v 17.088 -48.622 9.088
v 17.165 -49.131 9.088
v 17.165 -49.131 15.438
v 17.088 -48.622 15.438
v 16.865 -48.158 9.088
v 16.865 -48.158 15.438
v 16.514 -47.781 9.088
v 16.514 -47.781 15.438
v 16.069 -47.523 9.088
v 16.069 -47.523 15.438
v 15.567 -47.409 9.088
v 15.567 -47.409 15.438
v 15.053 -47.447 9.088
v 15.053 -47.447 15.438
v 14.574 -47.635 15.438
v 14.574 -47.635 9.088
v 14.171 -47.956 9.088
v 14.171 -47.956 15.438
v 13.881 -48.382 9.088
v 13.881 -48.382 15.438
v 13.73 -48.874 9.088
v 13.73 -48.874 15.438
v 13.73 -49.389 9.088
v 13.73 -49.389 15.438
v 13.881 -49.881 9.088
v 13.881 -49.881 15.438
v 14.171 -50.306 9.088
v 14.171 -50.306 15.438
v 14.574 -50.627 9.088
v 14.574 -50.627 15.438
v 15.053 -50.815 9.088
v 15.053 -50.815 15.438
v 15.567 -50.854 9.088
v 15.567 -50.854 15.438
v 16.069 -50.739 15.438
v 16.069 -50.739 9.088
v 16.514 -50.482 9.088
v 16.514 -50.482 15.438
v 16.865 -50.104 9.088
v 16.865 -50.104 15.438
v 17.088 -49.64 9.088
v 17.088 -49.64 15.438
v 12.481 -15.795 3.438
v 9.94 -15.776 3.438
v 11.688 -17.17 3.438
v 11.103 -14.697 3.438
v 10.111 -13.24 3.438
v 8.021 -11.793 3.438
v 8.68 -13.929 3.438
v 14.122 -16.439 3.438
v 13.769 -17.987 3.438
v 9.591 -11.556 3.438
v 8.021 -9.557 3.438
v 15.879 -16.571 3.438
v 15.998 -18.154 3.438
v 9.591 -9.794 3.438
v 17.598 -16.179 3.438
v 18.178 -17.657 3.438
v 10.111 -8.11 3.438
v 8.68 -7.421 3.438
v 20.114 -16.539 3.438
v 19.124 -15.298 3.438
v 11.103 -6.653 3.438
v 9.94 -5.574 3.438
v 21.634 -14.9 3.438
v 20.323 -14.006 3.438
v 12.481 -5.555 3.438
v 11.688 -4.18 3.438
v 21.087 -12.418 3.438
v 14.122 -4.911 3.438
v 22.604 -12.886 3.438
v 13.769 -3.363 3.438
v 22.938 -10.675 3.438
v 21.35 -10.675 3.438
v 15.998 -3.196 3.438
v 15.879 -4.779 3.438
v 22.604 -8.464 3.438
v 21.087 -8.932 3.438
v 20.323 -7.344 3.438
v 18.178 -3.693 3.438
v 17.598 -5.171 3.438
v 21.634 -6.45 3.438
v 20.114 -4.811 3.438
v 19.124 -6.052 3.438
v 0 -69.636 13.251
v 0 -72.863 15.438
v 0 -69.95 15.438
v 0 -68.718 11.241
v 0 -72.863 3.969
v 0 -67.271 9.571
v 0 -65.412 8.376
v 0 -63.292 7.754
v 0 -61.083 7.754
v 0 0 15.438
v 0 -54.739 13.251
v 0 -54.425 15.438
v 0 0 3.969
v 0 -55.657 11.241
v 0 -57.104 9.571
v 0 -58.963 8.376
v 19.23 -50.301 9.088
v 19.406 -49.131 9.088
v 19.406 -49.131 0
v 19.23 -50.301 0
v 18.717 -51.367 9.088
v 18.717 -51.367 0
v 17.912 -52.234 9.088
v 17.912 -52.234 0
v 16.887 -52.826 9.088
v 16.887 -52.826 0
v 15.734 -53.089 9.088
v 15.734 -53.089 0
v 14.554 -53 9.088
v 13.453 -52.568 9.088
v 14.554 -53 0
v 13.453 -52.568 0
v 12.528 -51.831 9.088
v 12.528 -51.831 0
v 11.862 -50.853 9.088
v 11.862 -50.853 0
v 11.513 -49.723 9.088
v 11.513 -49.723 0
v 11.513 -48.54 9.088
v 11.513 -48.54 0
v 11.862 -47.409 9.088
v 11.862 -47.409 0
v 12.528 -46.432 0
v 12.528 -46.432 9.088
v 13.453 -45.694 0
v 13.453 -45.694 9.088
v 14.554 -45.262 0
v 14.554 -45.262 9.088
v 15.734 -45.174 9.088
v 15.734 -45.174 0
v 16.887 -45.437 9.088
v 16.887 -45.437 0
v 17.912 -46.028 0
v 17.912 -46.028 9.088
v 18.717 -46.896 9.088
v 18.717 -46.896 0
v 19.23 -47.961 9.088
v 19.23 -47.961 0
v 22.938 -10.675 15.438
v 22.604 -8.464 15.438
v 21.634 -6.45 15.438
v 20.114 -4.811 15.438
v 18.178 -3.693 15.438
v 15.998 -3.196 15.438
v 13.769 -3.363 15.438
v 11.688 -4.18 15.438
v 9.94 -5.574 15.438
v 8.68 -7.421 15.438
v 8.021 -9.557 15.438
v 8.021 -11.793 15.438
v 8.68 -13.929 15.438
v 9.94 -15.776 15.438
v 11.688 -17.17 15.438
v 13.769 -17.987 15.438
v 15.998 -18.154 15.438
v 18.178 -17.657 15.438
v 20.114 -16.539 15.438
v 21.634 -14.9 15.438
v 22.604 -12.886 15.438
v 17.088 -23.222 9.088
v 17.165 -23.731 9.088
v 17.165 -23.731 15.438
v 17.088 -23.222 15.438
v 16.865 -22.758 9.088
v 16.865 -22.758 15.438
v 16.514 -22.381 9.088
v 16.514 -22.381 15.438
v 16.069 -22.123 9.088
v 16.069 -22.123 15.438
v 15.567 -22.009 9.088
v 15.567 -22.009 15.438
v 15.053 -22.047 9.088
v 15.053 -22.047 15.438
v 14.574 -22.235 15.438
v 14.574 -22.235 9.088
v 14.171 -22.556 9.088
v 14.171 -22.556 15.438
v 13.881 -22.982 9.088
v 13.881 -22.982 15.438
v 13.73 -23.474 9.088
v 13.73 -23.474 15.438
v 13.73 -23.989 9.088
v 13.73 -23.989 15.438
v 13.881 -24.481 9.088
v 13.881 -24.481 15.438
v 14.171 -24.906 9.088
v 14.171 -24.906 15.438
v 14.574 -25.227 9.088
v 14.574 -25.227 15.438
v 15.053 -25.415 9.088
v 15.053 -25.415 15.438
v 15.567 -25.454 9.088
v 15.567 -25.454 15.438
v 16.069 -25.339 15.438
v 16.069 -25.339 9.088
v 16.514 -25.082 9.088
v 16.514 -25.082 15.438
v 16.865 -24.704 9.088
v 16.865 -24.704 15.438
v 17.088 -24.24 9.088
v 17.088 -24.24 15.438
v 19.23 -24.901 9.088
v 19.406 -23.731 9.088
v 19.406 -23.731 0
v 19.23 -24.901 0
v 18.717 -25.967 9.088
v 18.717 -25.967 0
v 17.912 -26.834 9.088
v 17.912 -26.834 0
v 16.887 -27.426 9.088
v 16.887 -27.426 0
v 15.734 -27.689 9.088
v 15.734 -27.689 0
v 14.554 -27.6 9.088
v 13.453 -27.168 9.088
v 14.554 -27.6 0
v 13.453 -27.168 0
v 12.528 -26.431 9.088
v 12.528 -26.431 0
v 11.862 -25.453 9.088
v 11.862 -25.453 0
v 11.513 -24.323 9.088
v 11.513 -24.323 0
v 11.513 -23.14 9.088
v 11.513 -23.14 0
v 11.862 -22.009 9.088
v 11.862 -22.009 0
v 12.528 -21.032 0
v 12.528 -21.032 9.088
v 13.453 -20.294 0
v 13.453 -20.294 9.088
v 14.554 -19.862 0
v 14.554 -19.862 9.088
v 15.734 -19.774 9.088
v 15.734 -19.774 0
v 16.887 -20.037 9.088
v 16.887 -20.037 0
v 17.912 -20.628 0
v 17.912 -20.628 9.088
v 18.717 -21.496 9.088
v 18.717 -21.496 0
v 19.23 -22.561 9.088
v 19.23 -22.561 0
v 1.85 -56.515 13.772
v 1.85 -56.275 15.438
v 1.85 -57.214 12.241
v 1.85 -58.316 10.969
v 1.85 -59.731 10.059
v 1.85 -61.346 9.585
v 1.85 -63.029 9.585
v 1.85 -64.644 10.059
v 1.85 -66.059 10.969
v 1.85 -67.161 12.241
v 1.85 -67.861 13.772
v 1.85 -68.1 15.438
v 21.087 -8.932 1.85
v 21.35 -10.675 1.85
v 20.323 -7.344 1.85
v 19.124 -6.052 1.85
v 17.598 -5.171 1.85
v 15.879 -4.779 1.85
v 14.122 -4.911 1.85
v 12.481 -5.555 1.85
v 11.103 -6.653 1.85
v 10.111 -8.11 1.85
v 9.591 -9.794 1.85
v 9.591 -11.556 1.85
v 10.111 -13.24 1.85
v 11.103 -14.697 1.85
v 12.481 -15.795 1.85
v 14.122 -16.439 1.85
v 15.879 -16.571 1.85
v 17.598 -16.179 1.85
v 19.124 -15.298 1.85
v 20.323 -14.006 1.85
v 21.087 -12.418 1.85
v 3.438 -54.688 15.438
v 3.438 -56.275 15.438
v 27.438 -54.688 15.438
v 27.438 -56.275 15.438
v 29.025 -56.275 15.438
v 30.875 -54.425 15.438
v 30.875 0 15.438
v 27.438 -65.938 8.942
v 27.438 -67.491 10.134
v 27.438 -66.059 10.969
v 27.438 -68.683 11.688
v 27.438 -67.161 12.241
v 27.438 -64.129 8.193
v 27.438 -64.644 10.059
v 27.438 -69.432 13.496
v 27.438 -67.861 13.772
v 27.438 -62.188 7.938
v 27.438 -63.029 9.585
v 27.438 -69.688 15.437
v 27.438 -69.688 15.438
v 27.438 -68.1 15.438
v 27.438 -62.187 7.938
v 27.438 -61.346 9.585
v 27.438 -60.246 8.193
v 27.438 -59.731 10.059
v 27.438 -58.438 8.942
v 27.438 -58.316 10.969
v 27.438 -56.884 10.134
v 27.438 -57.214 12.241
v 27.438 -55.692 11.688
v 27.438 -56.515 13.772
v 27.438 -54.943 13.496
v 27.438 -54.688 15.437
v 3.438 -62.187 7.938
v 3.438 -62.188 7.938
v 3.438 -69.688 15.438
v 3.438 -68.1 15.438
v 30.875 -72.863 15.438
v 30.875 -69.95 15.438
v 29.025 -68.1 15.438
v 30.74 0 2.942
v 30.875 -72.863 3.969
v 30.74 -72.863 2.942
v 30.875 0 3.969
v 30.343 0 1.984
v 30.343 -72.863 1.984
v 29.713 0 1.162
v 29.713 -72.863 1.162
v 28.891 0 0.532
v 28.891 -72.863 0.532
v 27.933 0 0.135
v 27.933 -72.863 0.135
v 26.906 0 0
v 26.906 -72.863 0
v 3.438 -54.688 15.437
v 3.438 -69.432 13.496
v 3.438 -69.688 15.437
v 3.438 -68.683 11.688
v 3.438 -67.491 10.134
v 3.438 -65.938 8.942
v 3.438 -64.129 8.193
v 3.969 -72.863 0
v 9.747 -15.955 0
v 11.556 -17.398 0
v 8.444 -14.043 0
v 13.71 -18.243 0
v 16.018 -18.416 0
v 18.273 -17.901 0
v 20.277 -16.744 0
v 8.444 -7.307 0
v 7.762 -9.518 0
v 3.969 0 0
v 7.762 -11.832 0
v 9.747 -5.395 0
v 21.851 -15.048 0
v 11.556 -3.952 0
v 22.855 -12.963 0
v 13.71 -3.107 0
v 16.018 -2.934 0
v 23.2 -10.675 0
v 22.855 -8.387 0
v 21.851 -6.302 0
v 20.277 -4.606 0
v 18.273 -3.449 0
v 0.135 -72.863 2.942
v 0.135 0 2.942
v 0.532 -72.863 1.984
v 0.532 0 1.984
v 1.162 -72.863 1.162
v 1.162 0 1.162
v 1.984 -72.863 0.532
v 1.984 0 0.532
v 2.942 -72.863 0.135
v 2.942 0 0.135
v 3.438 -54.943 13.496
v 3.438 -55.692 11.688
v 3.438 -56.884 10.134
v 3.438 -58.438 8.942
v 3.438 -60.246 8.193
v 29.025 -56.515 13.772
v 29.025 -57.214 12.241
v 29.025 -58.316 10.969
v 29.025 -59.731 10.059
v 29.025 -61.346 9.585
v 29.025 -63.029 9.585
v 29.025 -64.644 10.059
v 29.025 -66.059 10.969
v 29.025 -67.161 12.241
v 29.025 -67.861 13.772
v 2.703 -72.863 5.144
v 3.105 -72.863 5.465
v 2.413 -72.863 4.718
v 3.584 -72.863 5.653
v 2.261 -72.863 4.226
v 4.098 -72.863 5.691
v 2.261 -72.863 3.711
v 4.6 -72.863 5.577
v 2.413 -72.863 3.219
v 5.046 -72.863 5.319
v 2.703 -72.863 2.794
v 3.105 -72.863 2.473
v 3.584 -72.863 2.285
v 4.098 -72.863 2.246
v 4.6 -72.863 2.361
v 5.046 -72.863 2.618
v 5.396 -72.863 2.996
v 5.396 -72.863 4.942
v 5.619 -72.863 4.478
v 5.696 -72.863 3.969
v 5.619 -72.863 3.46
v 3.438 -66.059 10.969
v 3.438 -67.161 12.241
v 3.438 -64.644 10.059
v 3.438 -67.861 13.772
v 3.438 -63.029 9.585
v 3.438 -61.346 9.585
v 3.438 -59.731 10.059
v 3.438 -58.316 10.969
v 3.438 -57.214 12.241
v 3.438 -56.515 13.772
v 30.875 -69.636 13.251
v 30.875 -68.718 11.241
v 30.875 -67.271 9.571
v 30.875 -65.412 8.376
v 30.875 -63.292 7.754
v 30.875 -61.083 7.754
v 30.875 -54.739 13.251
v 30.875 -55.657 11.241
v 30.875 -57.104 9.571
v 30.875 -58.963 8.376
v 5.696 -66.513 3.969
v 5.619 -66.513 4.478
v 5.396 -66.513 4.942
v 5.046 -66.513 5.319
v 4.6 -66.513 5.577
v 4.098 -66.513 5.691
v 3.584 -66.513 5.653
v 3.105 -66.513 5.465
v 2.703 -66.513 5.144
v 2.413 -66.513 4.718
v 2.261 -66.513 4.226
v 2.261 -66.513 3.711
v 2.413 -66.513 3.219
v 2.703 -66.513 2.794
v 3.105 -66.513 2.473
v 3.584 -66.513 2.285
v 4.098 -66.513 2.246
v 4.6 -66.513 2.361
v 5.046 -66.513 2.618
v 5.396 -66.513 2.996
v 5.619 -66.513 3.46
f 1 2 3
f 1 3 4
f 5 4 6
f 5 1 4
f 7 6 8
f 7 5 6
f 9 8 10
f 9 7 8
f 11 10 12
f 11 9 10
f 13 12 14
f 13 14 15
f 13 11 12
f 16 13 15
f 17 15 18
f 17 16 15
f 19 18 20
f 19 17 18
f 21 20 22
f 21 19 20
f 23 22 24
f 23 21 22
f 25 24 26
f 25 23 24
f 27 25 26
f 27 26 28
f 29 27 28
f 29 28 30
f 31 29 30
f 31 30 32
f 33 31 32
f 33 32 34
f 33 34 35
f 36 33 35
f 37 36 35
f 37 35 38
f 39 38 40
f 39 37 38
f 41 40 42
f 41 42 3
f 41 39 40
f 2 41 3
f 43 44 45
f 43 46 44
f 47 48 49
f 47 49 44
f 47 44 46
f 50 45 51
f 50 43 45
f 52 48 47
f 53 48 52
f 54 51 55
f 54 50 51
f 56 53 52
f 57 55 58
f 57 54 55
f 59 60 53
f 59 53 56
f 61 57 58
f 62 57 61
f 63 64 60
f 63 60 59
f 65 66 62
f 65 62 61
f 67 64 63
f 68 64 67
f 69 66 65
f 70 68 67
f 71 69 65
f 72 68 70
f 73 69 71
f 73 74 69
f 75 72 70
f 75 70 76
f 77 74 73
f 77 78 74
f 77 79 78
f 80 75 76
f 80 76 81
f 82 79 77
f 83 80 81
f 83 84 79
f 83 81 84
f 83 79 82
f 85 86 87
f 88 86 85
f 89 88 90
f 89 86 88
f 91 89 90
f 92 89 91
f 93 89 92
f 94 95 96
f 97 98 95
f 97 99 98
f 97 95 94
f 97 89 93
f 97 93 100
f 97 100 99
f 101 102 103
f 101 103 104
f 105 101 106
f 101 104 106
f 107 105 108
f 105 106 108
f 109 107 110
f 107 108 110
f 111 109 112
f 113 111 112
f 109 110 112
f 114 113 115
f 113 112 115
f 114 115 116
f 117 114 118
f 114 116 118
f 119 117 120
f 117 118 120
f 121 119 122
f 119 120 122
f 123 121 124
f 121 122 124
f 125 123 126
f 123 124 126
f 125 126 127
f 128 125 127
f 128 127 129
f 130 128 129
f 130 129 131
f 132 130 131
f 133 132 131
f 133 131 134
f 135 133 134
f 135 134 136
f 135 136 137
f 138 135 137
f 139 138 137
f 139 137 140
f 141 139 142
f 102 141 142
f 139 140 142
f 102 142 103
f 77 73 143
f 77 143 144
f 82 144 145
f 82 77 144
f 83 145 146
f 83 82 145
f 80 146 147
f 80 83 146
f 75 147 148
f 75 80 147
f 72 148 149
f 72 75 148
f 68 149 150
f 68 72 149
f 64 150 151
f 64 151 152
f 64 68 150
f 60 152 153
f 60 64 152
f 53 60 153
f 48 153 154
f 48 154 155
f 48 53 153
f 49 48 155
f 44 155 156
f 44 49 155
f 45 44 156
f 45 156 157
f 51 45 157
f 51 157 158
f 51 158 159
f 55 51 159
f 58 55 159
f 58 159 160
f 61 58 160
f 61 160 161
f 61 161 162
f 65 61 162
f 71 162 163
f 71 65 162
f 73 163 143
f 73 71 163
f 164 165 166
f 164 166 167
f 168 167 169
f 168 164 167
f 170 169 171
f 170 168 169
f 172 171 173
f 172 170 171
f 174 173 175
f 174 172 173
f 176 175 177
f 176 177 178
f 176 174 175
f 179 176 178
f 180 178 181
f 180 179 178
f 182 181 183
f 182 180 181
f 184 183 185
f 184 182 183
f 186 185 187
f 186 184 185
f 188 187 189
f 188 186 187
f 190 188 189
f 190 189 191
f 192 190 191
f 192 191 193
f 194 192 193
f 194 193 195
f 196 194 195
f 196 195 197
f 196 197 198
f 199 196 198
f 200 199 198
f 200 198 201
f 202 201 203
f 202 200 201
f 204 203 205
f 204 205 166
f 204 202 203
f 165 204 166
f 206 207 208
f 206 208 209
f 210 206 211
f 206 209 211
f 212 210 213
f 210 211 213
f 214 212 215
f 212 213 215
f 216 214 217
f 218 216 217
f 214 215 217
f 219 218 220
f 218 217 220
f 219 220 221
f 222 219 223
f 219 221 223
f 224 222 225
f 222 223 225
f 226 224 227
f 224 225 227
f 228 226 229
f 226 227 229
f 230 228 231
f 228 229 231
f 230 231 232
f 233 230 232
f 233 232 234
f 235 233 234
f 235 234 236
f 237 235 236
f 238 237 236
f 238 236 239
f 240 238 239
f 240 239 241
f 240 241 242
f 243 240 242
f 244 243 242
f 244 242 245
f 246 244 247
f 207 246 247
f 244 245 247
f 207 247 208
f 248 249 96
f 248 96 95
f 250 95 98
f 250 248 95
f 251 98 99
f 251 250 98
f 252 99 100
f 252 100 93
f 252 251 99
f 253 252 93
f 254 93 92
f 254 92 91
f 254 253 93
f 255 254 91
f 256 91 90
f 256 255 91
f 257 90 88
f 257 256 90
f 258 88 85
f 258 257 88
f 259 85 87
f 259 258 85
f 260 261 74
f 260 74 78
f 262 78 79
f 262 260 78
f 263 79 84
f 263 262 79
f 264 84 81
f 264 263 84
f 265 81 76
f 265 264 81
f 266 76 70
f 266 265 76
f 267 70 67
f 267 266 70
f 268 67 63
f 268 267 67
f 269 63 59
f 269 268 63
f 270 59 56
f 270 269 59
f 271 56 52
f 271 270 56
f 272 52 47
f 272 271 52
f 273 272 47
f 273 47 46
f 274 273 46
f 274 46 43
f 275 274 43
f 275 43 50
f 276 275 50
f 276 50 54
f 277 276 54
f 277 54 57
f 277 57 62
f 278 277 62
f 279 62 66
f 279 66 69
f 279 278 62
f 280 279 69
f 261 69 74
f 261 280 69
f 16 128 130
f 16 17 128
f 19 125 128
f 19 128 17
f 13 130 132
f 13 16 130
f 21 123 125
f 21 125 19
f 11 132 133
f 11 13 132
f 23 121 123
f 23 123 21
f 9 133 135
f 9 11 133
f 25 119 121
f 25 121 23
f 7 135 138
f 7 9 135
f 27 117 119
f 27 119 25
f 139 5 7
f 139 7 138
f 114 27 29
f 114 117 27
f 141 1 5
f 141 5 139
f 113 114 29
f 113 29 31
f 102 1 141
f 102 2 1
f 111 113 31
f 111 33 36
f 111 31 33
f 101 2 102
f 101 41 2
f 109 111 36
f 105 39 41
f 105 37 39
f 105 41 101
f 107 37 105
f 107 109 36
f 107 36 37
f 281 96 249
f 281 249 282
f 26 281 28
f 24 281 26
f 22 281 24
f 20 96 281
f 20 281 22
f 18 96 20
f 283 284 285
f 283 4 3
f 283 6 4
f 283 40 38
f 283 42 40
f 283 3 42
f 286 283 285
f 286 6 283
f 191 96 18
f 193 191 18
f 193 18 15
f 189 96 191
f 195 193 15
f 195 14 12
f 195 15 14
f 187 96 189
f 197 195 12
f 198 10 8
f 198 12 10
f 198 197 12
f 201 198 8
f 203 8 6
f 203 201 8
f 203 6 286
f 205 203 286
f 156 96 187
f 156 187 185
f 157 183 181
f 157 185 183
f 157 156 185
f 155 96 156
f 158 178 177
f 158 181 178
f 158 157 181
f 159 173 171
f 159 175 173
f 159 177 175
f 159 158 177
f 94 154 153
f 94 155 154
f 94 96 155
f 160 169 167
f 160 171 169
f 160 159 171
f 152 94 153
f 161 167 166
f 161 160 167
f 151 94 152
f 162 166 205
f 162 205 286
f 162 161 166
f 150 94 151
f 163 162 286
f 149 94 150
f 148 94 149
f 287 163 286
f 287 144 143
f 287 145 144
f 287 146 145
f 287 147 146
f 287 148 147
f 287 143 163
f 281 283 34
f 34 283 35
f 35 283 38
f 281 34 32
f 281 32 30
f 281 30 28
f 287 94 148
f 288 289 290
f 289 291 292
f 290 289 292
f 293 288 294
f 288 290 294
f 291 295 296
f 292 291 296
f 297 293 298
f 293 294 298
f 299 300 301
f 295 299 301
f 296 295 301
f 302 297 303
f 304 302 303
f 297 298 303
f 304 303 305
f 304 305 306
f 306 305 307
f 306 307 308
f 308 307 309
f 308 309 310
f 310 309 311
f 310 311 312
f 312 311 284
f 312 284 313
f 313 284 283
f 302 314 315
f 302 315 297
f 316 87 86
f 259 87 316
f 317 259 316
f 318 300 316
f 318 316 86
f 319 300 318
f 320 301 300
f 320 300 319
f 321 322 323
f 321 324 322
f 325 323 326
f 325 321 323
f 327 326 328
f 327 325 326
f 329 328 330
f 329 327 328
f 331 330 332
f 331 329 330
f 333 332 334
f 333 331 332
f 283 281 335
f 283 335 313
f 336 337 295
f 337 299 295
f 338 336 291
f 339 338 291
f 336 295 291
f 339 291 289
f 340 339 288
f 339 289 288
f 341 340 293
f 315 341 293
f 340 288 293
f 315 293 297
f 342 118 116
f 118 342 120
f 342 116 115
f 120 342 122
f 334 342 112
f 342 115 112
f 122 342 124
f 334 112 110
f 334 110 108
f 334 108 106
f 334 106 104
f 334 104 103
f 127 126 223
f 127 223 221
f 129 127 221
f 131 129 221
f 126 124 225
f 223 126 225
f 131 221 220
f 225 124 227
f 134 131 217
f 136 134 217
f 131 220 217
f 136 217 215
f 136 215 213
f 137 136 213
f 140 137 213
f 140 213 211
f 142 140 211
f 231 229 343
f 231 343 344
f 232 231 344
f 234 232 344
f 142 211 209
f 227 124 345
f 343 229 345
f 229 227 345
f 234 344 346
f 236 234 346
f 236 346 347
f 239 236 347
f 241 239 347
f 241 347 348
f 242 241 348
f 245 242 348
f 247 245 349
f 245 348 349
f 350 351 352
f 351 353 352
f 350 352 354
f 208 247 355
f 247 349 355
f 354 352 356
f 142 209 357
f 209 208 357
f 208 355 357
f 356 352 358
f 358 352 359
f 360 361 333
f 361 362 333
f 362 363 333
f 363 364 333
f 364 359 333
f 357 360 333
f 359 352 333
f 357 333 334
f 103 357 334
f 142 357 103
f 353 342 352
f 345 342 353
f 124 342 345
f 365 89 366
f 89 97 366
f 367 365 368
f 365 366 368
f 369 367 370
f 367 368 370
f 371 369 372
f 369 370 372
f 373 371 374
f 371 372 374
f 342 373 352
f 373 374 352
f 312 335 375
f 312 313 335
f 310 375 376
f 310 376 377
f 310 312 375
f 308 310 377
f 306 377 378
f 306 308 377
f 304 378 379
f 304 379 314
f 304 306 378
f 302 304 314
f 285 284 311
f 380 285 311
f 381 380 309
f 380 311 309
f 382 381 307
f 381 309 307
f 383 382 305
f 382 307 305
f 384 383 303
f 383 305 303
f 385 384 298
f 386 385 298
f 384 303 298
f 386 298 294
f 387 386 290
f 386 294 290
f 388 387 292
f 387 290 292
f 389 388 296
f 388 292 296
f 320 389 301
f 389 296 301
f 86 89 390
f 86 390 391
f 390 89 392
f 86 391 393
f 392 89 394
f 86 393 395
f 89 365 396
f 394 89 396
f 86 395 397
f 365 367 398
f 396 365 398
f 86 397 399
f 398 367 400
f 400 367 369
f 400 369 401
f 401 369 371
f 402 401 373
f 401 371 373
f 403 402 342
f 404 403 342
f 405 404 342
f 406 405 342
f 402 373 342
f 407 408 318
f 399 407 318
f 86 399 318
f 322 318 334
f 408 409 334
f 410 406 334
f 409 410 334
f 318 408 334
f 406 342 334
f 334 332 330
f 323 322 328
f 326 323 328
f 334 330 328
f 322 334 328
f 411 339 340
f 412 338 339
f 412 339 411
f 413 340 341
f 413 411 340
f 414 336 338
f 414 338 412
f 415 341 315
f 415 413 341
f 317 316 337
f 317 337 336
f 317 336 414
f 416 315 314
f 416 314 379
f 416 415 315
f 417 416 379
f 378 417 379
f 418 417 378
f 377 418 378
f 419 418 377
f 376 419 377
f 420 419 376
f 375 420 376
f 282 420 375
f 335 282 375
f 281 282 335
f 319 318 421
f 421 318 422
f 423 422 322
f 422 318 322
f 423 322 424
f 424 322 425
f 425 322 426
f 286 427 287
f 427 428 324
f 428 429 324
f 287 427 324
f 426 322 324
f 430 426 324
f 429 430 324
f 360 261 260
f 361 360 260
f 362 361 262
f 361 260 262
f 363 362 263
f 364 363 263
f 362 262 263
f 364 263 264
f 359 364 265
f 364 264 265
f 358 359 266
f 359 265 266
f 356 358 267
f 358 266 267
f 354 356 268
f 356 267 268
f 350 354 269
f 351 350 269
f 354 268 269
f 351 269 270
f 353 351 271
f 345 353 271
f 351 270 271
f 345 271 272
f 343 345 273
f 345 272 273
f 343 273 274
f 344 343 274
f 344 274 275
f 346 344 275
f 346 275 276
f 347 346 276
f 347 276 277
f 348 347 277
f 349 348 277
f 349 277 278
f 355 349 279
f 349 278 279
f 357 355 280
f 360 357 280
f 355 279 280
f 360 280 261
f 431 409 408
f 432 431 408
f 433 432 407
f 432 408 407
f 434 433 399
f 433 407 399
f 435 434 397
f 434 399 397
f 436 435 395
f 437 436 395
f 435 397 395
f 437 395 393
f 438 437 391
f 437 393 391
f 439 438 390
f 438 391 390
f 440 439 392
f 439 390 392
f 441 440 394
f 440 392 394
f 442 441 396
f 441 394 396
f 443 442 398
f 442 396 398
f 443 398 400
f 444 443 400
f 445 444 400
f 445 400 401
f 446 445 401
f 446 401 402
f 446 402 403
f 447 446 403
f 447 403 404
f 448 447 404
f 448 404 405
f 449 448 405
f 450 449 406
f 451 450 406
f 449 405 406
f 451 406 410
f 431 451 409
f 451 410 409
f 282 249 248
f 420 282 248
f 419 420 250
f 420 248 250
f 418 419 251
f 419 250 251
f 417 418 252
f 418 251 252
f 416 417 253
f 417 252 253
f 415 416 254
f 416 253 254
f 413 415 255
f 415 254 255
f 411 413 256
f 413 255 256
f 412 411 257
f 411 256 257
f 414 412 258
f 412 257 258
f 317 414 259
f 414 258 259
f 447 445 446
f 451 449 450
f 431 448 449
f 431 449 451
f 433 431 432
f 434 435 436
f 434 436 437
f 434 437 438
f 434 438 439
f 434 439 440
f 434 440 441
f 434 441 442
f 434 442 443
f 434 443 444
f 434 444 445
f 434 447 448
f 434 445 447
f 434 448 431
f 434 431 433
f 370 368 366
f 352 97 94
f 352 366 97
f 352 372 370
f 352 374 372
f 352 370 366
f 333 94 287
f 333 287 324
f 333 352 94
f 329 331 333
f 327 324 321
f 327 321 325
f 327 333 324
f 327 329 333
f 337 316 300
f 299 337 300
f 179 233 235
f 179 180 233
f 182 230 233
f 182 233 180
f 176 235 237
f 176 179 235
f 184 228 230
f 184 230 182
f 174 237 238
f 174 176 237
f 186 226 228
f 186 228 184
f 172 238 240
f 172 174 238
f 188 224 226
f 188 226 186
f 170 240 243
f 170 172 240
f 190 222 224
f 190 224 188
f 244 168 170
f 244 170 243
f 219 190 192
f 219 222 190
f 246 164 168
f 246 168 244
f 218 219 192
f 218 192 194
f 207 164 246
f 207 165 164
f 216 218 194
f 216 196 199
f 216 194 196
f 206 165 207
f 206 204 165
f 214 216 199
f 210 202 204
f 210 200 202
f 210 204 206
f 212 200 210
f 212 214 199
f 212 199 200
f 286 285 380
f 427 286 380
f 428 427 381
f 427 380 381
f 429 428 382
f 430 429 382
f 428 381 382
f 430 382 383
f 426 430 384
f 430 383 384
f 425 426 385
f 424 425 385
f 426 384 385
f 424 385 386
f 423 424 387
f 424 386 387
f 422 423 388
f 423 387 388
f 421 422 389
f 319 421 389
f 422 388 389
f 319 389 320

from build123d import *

# Parameters (mm, degrees)
F0_W      = 30.8750208
F0_H      = 72.8625058
F0_R      = 1.7272
F0_R_2    = 5.9124977
F1_DEPTH  = 3.437509
F2_W      = 30.8750208
F2_H      = 72.8625058
F2_R      = 1.7272
F2_R_2    = 7.5
F3_DEPTH  = 12
F4_W      = 24
F4_H      = 15
F5_DEPTH  = 7.5
F6_R      = 7.49999
F8_DEPTH  = 30.8750208
F9_R      = 3.96875
F10_DEPTH = 9.0875104
F11_R     = 3.96875
F12_R     = 1.7272
F13_DEPTH = 6.35
F14_SIZE  = 1.850009


# Not quite as in the source:
# - a fillet or chamfer is up to 0.001 mm smaller than in the source, because OpenCascade refuses the exact size


with BuildPart() as f1:
    # F0 (on Top) → F1 (new body)
    with BuildSketch(Plane.XY):
        with Locations((15.4375104, -36.4312529)):
            Rectangle(F0_W, F0_H)
        with Locations((15.4375104, -49.1312477)):
            Circle(F0_R, mode=Mode.SUBTRACT)
        with Locations((15.4375104, -23.7312477)):
            Circle(F0_R, mode=Mode.SUBTRACT)
        with Locations((15.4375104, -10.6749977)):
            Circle(F0_R_2, mode=Mode.SUBTRACT)
    extrude(amount=F1_DEPTH)

    # F2 (on face) → F3 (join)
    with BuildSketch(Plane.XY.offset(3.437509)):
        with Locations((15.4375104, -36.4312529)):
            Rectangle(F2_W, F2_H)
        with Locations((15.4375104, -49.1312477)):
            Circle(F2_R, mode=Mode.SUBTRACT)
        with Locations((15.4375104, -23.7312477)):
            Circle(F2_R, mode=Mode.SUBTRACT)
        with Locations((15.4375104, -10.6749977)):
            Circle(F2_R_2, mode=Mode.SUBTRACT)
    extrude(amount=F3_DEPTH)

    # F4 (on face) → F5 (cut)
    with BuildSketch(Plane.XY.offset(15.437509)):
        with Locations((15.4375104, -62.1875058)):
            Rectangle(F4_W, F4_H)
    extrude(amount=-F5_DEPTH, mode=Mode.SUBTRACT)

    # F6 (radius 7.5 in the source; OpenCascade refuses exactly that, so slightly less here)
    f6_edges = [f1.edges().sort_by_distance(p)[0] for p in [
        (15.43751, -54.687506, 7.937509),
        (15.43751, -69.687506, 7.937509),
    ]]
    fillet(f6_edges, radius=F6_R)

    # F7 (on face) → F8 (cut, through all)
    with BuildSketch(Plane(origin=(0, 0, 0), x_dir=(0, -1, 0), z_dir=(-1, 0, 0))):
        with BuildLine():
            Line((68.1000035, 15.437509), (56.2750081, 15.437509))
            ThreePointArc((56.2750081, 15.437509), (62.1875058, 9.5250113), (68.1000035, 15.437509))
        make_face()
    extrude(amount=-F8_DEPTH, mode=Mode.SUBTRACT)

    # F9 (on face) → F10 (cut)
    with BuildSketch(Plane(origin=(0, 0, 0), x_dir=(1, 0, 0), z_dir=(0, 0, -1))):
        with Locations((15.4375104, 23.7312477)):
            Circle(F9_R)
        with Locations((15.4375104, 49.1312477)):
            Circle(F9_R)
    extrude(amount=-F10_DEPTH, mode=Mode.SUBTRACT)

    # F11
    f11_edges = [f1.edges().sort_by_distance(p)[0] for p in [
        (0, -36.431253, 0),
        (30.875021, -36.431253, 0),
    ]]
    fillet(f11_edges, radius=F11_R)

    # F12 (on face) → F13 (cut)
    with BuildSketch(Plane.XZ.offset(72.8625058)):
        with Locations((3.96875, 3.96875)):
            Circle(F12_R)
    extrude(amount=-F13_DEPTH, mode=Mode.SUBTRACT)

    # F14
    f14_edges = [f1.edges().sort_by_distance(p)[0] for p in [
        (9.525013, -10.674998, 0),
        (30.875021, -62.187506, 9.525011),
        (0, -62.187506, 9.525011),
    ]]
    chamfer(f14_edges, length=F14_SIZE)


solid = f1.part
